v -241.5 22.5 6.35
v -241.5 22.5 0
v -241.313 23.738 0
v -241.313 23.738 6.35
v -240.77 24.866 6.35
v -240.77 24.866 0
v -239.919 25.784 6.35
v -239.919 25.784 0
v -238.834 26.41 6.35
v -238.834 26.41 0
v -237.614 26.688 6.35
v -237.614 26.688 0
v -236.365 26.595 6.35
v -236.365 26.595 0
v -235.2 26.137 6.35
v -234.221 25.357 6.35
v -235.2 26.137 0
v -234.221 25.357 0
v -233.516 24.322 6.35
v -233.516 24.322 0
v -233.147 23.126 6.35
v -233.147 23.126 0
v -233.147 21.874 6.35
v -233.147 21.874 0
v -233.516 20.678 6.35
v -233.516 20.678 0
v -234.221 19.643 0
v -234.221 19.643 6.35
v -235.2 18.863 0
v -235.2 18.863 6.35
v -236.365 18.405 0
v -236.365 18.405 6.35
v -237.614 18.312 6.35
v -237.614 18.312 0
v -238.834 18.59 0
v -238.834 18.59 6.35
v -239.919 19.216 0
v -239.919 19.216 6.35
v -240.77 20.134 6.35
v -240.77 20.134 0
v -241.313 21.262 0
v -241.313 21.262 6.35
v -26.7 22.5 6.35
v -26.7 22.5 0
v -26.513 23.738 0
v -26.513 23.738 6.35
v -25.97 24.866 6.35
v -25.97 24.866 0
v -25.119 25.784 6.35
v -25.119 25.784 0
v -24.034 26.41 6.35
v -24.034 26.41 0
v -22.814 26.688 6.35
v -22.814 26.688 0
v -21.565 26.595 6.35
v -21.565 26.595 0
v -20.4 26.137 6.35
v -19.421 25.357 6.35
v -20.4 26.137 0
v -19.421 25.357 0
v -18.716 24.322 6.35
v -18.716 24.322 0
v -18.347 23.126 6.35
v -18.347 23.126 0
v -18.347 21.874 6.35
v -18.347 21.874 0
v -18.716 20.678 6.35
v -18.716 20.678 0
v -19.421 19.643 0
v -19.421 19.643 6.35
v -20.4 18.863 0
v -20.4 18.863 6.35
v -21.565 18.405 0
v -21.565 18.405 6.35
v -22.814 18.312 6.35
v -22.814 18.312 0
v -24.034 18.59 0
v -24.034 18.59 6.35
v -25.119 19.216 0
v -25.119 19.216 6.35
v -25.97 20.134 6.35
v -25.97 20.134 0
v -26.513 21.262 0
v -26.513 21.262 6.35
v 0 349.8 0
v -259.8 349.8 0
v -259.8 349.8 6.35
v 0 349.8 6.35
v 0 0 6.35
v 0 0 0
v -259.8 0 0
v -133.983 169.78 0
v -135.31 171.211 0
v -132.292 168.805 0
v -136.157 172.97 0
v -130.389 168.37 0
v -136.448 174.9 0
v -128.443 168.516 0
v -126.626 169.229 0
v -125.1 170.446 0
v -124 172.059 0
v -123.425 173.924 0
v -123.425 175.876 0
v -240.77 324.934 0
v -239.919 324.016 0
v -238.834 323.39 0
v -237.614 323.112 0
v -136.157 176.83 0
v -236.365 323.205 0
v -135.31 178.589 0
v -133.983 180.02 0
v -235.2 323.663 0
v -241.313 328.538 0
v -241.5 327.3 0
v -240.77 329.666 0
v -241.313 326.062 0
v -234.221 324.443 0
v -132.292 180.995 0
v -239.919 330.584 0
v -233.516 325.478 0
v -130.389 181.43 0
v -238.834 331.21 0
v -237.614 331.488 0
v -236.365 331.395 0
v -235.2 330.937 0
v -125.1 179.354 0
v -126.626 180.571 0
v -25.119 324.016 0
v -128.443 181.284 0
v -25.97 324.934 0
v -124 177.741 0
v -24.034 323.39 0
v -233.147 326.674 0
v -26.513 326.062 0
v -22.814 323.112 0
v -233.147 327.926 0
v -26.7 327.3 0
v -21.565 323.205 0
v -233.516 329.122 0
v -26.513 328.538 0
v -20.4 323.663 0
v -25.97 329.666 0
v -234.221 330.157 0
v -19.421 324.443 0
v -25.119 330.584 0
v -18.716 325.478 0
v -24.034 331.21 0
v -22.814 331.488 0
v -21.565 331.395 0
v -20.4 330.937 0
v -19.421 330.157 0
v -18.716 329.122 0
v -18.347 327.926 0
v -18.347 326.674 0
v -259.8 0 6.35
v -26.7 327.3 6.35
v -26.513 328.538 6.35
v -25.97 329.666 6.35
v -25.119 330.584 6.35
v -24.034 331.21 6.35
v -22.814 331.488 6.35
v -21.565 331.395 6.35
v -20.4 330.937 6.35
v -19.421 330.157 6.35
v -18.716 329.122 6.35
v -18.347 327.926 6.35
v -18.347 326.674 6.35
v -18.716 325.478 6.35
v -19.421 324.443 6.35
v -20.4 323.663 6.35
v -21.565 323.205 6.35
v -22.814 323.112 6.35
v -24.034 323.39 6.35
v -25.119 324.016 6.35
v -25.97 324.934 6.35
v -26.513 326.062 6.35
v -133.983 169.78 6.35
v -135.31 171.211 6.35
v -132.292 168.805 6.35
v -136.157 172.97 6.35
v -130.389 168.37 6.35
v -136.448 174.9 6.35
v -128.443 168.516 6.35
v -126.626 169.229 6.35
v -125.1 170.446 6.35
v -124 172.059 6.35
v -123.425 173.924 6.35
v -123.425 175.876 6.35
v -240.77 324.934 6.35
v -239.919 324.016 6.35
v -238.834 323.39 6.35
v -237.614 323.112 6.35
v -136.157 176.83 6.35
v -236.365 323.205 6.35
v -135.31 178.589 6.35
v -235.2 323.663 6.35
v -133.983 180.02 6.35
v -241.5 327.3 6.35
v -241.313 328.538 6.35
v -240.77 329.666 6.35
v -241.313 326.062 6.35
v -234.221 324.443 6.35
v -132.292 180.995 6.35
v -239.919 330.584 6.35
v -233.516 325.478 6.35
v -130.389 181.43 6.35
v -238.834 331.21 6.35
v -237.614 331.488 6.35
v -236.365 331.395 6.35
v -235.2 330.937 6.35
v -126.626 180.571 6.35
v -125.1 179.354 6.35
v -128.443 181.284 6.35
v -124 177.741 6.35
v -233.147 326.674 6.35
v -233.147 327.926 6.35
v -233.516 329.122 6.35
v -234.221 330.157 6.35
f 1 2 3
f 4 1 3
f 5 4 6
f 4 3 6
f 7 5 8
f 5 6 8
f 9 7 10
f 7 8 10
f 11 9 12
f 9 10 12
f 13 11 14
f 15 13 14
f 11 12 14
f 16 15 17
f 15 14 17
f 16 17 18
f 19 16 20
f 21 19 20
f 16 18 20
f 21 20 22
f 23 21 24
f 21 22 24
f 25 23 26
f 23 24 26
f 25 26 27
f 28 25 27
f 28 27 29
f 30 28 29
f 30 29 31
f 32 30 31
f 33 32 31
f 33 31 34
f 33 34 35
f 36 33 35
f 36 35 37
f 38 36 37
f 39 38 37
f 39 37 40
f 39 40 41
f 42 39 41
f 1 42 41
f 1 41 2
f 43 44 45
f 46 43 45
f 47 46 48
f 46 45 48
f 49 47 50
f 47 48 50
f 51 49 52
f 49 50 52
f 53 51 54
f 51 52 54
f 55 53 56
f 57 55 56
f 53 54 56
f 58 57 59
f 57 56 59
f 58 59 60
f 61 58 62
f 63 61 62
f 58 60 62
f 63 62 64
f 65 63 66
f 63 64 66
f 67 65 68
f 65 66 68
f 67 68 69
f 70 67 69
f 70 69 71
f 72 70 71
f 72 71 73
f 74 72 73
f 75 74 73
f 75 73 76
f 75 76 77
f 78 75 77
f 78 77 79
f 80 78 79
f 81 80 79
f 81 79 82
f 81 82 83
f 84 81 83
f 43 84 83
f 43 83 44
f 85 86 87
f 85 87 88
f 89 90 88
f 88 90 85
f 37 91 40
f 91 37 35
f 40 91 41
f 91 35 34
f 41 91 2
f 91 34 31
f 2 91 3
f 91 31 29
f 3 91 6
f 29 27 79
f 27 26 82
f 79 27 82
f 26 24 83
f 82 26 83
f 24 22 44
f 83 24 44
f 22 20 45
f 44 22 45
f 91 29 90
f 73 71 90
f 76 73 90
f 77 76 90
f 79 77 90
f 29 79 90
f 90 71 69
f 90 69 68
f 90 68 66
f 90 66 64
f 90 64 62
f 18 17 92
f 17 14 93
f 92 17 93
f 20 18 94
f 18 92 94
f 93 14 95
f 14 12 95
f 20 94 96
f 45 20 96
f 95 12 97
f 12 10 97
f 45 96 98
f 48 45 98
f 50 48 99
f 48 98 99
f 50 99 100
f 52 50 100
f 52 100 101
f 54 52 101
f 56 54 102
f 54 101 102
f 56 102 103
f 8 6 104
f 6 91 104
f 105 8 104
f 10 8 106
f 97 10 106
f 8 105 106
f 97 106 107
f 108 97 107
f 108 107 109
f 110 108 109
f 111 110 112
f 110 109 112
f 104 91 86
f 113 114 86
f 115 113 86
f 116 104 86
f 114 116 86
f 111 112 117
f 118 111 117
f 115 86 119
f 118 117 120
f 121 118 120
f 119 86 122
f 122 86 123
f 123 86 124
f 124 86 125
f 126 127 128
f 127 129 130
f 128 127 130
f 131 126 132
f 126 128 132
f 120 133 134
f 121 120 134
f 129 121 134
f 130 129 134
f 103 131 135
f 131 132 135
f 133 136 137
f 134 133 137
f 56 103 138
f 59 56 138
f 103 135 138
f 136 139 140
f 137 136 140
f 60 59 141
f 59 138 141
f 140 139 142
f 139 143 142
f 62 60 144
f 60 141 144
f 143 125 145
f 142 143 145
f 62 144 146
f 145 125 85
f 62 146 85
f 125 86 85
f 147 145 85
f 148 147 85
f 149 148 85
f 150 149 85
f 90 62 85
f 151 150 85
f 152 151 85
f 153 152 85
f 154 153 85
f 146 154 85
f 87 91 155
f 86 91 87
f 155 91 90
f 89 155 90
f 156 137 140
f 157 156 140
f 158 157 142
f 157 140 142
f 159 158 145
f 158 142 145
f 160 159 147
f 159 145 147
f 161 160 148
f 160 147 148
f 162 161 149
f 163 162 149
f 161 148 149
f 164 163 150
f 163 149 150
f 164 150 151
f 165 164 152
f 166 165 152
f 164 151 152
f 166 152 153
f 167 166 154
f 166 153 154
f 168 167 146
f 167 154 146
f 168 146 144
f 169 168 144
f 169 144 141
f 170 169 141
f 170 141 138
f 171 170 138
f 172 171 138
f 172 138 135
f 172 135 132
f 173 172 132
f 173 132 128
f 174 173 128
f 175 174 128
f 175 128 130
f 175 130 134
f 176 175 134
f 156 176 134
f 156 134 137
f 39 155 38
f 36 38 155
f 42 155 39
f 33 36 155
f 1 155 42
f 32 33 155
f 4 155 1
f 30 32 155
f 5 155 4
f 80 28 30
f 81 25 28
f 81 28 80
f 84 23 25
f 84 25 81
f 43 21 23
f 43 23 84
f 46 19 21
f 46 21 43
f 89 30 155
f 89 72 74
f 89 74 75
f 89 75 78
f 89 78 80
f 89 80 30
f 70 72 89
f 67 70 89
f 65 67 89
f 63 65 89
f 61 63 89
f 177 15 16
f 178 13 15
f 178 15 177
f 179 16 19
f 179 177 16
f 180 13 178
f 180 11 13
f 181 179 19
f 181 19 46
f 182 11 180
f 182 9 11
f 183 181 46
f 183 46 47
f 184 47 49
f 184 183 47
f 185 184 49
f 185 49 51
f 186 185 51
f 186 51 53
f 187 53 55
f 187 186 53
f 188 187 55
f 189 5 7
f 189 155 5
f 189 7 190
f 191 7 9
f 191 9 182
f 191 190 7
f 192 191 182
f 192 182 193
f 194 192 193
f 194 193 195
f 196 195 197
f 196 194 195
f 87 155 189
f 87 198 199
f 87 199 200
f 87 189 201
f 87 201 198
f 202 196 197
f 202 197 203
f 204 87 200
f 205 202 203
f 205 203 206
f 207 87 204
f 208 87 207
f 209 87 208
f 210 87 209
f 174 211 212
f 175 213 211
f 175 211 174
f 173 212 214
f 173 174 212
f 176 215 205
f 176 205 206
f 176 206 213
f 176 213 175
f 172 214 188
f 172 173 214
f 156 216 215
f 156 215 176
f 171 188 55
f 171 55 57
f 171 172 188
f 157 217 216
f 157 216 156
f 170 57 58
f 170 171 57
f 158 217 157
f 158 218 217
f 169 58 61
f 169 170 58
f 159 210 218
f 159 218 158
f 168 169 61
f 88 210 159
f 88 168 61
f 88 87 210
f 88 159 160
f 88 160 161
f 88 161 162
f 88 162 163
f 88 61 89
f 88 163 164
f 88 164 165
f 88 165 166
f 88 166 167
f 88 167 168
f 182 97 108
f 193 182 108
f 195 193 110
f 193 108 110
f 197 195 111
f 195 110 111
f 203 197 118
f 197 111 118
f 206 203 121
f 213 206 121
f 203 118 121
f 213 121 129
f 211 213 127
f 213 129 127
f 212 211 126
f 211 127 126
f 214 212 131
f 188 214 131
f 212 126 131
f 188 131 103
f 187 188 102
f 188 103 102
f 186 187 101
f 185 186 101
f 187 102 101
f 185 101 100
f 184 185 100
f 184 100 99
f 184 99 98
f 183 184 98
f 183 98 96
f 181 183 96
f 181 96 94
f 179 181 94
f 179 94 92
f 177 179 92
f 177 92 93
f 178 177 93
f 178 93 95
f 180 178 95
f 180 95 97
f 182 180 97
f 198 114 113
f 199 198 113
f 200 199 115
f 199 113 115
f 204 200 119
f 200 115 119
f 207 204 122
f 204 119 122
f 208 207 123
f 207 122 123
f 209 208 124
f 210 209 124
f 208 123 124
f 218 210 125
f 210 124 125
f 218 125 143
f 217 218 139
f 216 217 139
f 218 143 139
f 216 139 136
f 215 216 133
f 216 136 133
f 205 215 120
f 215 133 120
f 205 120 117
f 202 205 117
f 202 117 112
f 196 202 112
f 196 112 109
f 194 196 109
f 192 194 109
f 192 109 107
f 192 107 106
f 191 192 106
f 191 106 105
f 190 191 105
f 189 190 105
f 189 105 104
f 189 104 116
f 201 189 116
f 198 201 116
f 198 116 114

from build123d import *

# Parameters (mm, degrees)
SKETCH1_W                   = 259.8
SKETCH1_H                   = 349.8
BOSS_EXTRUDE1_DEPTH         = 6.35
F_1_2_CLEARANCE_HOLE1_D     = 13.09624
F_1_2_CLEARANCE_HOLE1_DEPTH = 22.352
F_1_2_CLEARANCE_HOLE1_TIP   = 3.934507437
M8_CLEARANCE_HOLE1_D        = 8.4
M8_CLEARANCE_HOLE1_DEPTH    = 76.2
M8_CLEARANCE_HOLE1_TIP      = 2.5236146


with BuildPart() as part:
    # Sketch1 → Boss-Extrude1 (new body)
    with BuildSketch(Plane.XY):
        with Locations((-129.9, 174.9)):
            Rectangle(SKETCH1_W, SKETCH1_H)
    extrude(amount=BOSS_EXTRUDE1_DEPTH)

    # 1/2 Clearance Hole1
    with Locations(Plane.XY.offset(6.35)):
        with Locations((-129.9, 174.9)):
            Hole(F_1_2_CLEARANCE_HOLE1_D / 2, depth=F_1_2_CLEARANCE_HOLE1_DEPTH)
            with Locations((0, 0, -(F_1_2_CLEARANCE_HOLE1_DEPTH + F_1_2_CLEARANCE_HOLE1_TIP / 2))):  # 118° drill point
                Cone(0, F_1_2_CLEARANCE_HOLE1_D / 2, F_1_2_CLEARANCE_HOLE1_TIP, mode=Mode.SUBTRACT)

    # M8 Clearance Hole1
    with Locations(Plane.XY.offset(6.35)):
        with Locations((-237.3, 327.3), (-22.5, 327.3), (-22.5, 22.5), (-237.3, 22.5)):
            Hole(M8_CLEARANCE_HOLE1_D / 2, depth=M8_CLEARANCE_HOLE1_DEPTH)
            with Locations((0, 0, -(M8_CLEARANCE_HOLE1_DEPTH + M8_CLEARANCE_HOLE1_TIP / 2))):  # 118° drill point
                Cone(0, M8_CLEARANCE_HOLE1_D / 2, M8_CLEARANCE_HOLE1_TIP, mode=Mode.SUBTRACT)


solid = part.part
